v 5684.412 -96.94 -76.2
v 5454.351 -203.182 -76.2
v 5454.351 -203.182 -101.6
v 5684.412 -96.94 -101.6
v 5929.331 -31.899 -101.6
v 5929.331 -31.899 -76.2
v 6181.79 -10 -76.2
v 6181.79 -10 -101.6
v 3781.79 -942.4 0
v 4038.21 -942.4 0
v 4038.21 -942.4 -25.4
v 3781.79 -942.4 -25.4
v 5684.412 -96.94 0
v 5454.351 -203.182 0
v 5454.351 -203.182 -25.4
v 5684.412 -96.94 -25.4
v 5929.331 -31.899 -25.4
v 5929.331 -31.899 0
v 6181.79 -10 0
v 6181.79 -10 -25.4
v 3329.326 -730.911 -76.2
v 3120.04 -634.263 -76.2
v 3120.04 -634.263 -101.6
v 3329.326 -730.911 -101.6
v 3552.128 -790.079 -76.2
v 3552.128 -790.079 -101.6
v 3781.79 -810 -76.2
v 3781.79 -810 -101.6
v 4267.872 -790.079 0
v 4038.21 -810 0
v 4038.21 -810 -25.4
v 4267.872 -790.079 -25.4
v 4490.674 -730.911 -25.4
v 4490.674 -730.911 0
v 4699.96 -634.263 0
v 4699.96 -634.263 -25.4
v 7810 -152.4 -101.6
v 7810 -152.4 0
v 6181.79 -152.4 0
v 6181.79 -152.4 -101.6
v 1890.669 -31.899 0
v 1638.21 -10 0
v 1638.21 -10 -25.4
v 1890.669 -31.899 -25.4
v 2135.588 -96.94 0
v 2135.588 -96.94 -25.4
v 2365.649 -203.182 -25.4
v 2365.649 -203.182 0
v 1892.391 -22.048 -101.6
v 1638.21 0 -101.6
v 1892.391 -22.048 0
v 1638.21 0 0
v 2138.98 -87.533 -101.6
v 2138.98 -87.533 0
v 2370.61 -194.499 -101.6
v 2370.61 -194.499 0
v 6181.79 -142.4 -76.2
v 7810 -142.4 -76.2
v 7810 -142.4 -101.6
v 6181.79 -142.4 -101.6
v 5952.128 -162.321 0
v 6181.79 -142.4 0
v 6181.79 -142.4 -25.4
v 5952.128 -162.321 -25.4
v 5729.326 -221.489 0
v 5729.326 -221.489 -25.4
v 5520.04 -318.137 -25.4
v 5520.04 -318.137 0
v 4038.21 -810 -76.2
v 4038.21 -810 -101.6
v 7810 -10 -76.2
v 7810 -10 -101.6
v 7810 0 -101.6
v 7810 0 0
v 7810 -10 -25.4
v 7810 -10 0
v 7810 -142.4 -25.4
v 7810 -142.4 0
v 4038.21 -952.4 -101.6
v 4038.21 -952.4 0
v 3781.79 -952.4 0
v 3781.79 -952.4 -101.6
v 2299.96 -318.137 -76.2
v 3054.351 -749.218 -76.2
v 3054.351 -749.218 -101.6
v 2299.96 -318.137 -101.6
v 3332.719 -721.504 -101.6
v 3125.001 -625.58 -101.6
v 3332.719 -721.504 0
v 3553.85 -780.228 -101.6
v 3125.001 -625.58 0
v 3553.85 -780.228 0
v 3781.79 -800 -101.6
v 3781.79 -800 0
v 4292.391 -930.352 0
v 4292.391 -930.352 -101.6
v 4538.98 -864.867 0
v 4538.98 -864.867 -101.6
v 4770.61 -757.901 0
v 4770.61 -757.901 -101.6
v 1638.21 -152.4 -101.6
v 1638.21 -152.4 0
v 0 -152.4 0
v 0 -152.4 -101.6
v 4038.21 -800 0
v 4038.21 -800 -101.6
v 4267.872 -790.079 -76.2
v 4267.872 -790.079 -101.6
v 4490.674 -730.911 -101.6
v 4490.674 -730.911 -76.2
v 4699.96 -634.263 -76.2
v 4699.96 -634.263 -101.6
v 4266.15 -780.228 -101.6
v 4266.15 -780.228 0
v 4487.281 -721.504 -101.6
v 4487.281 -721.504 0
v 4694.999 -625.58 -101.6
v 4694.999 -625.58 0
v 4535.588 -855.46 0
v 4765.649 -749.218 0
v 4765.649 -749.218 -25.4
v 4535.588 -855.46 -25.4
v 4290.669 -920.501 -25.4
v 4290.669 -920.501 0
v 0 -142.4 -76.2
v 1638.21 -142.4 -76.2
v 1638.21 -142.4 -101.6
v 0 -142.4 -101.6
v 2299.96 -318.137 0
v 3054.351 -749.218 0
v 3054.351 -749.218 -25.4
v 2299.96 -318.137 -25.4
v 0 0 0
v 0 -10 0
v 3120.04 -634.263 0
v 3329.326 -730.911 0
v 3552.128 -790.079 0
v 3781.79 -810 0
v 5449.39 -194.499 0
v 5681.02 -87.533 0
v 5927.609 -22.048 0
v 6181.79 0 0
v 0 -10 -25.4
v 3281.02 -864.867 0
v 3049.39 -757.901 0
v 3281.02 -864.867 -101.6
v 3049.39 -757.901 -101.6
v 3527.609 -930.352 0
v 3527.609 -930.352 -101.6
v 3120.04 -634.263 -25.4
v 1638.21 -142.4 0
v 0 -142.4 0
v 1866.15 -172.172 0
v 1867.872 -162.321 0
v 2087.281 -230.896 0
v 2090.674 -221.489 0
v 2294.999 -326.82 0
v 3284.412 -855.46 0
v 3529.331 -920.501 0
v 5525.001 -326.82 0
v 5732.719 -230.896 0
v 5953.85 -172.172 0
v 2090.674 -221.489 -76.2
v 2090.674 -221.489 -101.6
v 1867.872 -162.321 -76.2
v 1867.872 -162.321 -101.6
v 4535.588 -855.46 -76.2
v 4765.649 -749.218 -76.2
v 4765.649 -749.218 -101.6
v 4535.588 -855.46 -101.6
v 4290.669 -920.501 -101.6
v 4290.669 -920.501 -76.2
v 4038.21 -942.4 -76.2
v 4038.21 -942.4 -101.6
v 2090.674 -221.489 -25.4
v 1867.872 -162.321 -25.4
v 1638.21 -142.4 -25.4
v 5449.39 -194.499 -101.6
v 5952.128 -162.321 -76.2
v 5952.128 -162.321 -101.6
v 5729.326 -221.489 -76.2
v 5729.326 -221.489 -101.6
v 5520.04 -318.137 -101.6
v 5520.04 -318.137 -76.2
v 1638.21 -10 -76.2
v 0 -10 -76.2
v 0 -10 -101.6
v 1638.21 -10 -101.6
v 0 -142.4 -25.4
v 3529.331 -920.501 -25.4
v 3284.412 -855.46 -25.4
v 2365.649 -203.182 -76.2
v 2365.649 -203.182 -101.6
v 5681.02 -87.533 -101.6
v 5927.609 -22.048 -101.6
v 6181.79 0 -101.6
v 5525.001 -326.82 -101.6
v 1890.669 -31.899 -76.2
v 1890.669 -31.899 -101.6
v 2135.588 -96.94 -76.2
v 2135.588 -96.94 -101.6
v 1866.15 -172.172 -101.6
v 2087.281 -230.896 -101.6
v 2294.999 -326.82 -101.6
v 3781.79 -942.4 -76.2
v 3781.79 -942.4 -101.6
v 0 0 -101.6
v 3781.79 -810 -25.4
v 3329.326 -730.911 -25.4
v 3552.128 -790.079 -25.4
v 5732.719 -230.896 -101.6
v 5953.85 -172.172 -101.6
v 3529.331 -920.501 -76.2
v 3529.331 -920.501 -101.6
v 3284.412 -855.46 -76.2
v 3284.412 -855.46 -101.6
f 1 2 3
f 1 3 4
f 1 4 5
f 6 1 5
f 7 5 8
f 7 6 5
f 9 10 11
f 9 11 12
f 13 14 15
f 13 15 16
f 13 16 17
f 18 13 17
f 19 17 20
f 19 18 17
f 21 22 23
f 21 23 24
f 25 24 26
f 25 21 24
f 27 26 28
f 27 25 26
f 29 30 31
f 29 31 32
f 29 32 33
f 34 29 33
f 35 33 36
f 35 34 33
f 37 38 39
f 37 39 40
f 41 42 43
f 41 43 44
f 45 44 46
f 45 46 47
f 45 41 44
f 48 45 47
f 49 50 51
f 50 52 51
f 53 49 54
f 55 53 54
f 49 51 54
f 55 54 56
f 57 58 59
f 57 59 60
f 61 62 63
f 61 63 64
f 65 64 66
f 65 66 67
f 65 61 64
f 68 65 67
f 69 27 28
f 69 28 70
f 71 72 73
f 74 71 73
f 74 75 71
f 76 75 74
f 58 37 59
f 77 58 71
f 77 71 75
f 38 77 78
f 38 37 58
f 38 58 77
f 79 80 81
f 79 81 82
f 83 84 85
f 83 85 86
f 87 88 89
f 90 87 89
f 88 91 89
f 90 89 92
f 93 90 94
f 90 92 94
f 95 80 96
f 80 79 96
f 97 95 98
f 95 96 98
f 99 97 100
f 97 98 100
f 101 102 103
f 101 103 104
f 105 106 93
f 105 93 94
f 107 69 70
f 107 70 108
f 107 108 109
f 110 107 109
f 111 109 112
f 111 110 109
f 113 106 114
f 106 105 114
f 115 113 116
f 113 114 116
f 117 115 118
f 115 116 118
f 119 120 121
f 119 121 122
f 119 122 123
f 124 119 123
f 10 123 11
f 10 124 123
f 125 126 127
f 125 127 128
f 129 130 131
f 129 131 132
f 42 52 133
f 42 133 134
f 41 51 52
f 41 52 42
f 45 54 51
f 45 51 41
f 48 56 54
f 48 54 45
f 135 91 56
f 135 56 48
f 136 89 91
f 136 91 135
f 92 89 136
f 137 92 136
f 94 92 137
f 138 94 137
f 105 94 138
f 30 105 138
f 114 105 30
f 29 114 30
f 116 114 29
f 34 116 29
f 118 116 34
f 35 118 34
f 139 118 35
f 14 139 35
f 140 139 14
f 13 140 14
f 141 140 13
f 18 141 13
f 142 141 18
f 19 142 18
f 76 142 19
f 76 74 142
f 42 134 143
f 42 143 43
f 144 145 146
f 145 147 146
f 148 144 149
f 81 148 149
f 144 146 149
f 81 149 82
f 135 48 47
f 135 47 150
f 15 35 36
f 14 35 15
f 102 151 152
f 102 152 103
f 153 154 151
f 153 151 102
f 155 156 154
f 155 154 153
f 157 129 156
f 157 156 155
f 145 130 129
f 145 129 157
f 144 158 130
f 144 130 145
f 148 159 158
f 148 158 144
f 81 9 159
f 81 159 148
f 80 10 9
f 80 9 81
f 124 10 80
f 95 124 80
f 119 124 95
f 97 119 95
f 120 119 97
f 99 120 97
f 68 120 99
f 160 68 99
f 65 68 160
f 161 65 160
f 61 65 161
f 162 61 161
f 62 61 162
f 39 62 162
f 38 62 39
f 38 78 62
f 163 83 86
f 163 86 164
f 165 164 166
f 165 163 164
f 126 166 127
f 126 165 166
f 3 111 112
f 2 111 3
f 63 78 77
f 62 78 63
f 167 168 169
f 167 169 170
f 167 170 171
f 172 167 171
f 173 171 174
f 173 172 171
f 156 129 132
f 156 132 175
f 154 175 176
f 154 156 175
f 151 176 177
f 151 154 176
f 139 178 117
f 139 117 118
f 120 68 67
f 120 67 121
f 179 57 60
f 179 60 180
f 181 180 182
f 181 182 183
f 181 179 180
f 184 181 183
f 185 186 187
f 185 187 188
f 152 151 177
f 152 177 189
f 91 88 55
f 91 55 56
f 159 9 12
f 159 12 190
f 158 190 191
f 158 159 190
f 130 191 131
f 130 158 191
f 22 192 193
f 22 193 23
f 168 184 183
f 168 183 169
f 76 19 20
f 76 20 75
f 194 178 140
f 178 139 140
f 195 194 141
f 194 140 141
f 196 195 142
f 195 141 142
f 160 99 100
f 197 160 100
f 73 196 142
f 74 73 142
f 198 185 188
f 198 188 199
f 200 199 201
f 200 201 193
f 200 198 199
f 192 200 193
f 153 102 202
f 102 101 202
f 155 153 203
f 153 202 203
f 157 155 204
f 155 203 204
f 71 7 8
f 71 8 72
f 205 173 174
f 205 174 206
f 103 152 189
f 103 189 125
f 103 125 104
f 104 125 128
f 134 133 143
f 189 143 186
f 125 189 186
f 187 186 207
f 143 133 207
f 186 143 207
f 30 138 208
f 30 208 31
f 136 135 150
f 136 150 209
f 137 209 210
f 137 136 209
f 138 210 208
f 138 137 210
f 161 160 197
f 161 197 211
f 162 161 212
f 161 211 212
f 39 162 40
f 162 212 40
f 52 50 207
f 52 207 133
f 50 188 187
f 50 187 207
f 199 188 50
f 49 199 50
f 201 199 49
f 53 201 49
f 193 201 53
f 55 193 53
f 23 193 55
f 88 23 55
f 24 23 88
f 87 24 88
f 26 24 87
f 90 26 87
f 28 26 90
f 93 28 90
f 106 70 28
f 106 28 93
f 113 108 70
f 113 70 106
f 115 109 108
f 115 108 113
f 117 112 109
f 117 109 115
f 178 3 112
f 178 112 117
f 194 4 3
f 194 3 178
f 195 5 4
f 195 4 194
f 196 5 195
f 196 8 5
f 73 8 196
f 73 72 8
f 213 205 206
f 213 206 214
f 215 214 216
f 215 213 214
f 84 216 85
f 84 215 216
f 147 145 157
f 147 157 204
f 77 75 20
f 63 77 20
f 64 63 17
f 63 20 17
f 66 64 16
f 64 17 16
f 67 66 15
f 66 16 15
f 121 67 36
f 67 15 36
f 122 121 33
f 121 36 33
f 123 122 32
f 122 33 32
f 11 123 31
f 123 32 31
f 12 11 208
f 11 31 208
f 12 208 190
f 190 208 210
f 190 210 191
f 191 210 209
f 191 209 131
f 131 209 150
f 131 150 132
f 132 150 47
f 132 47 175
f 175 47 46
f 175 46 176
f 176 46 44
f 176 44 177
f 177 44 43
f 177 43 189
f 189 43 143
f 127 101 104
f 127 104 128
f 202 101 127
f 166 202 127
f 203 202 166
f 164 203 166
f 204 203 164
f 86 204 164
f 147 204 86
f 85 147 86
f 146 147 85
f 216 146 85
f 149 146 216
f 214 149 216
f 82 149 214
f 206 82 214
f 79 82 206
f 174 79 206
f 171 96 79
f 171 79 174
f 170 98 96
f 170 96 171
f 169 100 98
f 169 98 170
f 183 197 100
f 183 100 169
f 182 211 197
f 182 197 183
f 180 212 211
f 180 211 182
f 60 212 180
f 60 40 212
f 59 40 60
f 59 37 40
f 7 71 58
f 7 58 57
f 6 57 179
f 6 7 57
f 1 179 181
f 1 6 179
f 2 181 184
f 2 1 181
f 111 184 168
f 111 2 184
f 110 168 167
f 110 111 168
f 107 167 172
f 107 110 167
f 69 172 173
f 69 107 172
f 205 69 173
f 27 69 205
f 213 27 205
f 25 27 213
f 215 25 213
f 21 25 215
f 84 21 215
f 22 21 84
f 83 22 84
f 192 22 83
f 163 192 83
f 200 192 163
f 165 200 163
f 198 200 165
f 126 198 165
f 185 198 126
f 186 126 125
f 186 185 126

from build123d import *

# Parameters (mm, degrees)
CROQUIS2_W              = 101.6
CROQUIS2_H              = 152.4
SALIENTE_EXTRUIR1_DEPTH = 10
CROQUIS4_W              = 101.6
CROQUIS4_H              = 152.4
CORTAR_EXTRUIR2_DEPTH   = 25.4
CORTAR_EXTRUIR3_START   = -25.4
CORTAR_EXTRUIR3_DEPTH   = 25.4


with BuildPart() as part:
    # Croquis2 → Saliente-Extruir1 (new body)
    with BuildSketch(Plane(origin=(0, 0, 0), x_dir=(0, 0, -1), z_dir=(1, 0, 0))):
        with Locations((50.8, -76.2)):
            Rectangle(CROQUIS2_W, CROQUIS2_H)
    extrude(amount=SALIENTE_EXTRUIR1_DEPTH)

    # Barrer1: sweep along a curve in space
    with BuildLine() as barrer1_path:
        Line((10, -76.2, -50.8), (1638.209788096, -76.2, -50.8))
        ThreePointArc((1638.209788096, -76.2, -50.8), (1997.544897315, -123.100491729, -50.8), (2332.804301795, -260.659601026, -50.8))
        Line((3087.195698205, -691.740398974, -50.8), (2332.804301795, -260.659601026, -50.8))
        ThreePointArc((3087.195698205, -691.740398974, -50.8), (3422.455102685, -829.299508271, -50.8), (3781.790211904, -876.2, -50.8))
        Line((3781.790211904, -876.2, -50.8), (4038.209788096, -876.2, -50.8))
        ThreePointArc((4038.209788096, -876.2, -50.8), (4397.544897315, -829.299508271, -50.8), (4732.804301795, -691.740398974, -50.8))
        Line((5487.195698205, -260.659601026, -50.8), (4732.804301795, -691.740398974, -50.8))
        ThreePointArc((5487.195698205, -260.659601026, -50.8), (5822.455102685, -123.100491729, -50.8), (6181.790211904, -76.2, -50.8))
        Line((6181.790211904, -76.2, -50.8), (7810, -76.2, -50.8))
    # Croquis4 → Barrer1 (sweep)
    with BuildSketch(Plane(origin=(10, 0, 0), x_dir=(0, 0, -1), z_dir=(1, 0, 0))):
        with Locations((50.8, -76.2)):
            Rectangle(CROQUIS4_W, CROQUIS4_H)
    sweep(path=barrer1_path.line)

    # Croquis6 → Cortar-Extruir2 (cut)
    with BuildSketch(Plane.XY):
        with BuildLine():
            Line((1638.209788096, -142.4), (10, -142.4))
            Line((10, -142.4), (0, -142.4))
            Line((0, -142.4), (0, -10))
            Line((0, -10), (10, -10))
            Line((10, -10), (1638.209788096, -10))
            ThreePointArc((1638.209788096, -10), (2014.536314623, -59.118214981), (2365.648699514, -203.181905017))
            Line((2365.648699514, -203.181905017), (3120.040095924, -634.262702966))
            ThreePointArc((3120.040095924, -634.262702966), (3439.446519992, -765.317231522), (3781.790211905, -810))
            Line((3781.790211905, -810), (4038.209788096, -810))
            ThreePointArc((4038.209788096, -810), (4380.553480008, -765.317231522), (4699.959904076, -634.262702966))
            Line((4699.959904076, -634.262702966), (5454.351300486, -203.181905017))
            ThreePointArc((5454.351300486, -203.181905017), (5805.463685377, -59.118214981), (6181.790211904, -10))
            Line((6181.790211904, -10), (7800, -10))
            Line((7800, -10), (7810, -10))
            Line((7810, -10), (7810, -142.4))
            Line((7810, -142.4), (7800, -142.4))
            Line((7800, -142.4), (6181.790211904, -142.4))
            ThreePointArc((6181.790211904, -142.4), (5839.446519992, -187.082768478), (5520.040095924, -318.137297034))
            Line((5520.040095924, -318.137297034), (4765.648699514, -749.218094983))
            ThreePointArc((4765.648699514, -749.218094983), (4414.536314623, -893.281785019), (4038.209788096, -942.4))
            Line((4038.209788096, -942.4), (3781.790211905, -942.4))
            ThreePointArc((3781.790211905, -942.4), (3405.463685377, -893.281785019), (3054.351300486, -749.218094983))
            Line((3054.351300486, -749.218094983), (2299.959904076, -318.137297034))
            ThreePointArc((2299.959904076, -318.137297034), (1980.553480008, -187.082768478), (1638.209788096, -142.4))
        make_face()
    extrude(amount=-CORTAR_EXTRUIR2_DEPTH, mode=Mode.SUBTRACT)

    # Croquis7 → Cortar-Extruir3 (cut)
    with BuildSketch(Plane(origin=(0, 0, -101.6), x_dir=(-1, 0, 0), z_dir=(0, 0, -1)).offset(CORTAR_EXTRUIR3_START)):
        with BuildLine():
            Line((0, -10), (-1638.209788096, -10))
            ThreePointArc((-1638.209788096, -10), (-2014.536314623, -59.118214981), (-2365.648699514, -203.181905017))
            Line((-2365.648699514, -203.181905017), (-3120.040095924, -634.262702966))
            ThreePointArc((-3120.040095924, -634.262702966), (-3439.446519992, -765.317231522), (-3781.790211904, -810))
            Line((-3781.790211904, -810), (-4038.209788096, -810))
            ThreePointArc((-4038.209788096, -810), (-4380.553480008, -765.317231522), (-4699.959904076, -634.262702966))
            Line((-4699.959904076, -634.262702966), (-5454.351300486, -203.181905017))
            ThreePointArc((-5454.351300486, -203.181905017), (-5805.463685377, -59.118214981), (-6181.790211904, -10))
            Line((-6181.790211904, -10), (-7810, -10))
            Line((-7810, -10), (-7810, -142.4))
            Line((-7810, -142.4), (-6181.790211904, -142.4))
            ThreePointArc((-6181.790211904, -142.4), (-5839.446519992, -187.082768478), (-5520.040095924, -318.137297034))
            Line((-5520.040095924, -318.137297034), (-4765.648699514, -749.218094983))
            ThreePointArc((-4765.648699514, -749.218094983), (-4414.536314623, -893.281785019), (-4038.209788096, -942.4))
            Line((-4038.209788096, -942.4), (-3781.790211905, -942.4))
            ThreePointArc((-3781.790211905, -942.4), (-3405.463685377, -893.281785019), (-3054.351300486, -749.218094983))
            Line((-3054.351300486, -749.218094983), (-2299.959904076, -318.137297034))
            ThreePointArc((-2299.959904076, -318.137297034), (-1980.553480008, -187.082768478), (-1638.209788096, -142.4))
            Line((-1638.209788096, -142.4), (0, -142.4))
            Line((0, -142.4), (0, -10))
        make_face()
    extrude(amount=CORTAR_EXTRUIR3_DEPTH, mode=Mode.SUBTRACT)


solid = part.part
